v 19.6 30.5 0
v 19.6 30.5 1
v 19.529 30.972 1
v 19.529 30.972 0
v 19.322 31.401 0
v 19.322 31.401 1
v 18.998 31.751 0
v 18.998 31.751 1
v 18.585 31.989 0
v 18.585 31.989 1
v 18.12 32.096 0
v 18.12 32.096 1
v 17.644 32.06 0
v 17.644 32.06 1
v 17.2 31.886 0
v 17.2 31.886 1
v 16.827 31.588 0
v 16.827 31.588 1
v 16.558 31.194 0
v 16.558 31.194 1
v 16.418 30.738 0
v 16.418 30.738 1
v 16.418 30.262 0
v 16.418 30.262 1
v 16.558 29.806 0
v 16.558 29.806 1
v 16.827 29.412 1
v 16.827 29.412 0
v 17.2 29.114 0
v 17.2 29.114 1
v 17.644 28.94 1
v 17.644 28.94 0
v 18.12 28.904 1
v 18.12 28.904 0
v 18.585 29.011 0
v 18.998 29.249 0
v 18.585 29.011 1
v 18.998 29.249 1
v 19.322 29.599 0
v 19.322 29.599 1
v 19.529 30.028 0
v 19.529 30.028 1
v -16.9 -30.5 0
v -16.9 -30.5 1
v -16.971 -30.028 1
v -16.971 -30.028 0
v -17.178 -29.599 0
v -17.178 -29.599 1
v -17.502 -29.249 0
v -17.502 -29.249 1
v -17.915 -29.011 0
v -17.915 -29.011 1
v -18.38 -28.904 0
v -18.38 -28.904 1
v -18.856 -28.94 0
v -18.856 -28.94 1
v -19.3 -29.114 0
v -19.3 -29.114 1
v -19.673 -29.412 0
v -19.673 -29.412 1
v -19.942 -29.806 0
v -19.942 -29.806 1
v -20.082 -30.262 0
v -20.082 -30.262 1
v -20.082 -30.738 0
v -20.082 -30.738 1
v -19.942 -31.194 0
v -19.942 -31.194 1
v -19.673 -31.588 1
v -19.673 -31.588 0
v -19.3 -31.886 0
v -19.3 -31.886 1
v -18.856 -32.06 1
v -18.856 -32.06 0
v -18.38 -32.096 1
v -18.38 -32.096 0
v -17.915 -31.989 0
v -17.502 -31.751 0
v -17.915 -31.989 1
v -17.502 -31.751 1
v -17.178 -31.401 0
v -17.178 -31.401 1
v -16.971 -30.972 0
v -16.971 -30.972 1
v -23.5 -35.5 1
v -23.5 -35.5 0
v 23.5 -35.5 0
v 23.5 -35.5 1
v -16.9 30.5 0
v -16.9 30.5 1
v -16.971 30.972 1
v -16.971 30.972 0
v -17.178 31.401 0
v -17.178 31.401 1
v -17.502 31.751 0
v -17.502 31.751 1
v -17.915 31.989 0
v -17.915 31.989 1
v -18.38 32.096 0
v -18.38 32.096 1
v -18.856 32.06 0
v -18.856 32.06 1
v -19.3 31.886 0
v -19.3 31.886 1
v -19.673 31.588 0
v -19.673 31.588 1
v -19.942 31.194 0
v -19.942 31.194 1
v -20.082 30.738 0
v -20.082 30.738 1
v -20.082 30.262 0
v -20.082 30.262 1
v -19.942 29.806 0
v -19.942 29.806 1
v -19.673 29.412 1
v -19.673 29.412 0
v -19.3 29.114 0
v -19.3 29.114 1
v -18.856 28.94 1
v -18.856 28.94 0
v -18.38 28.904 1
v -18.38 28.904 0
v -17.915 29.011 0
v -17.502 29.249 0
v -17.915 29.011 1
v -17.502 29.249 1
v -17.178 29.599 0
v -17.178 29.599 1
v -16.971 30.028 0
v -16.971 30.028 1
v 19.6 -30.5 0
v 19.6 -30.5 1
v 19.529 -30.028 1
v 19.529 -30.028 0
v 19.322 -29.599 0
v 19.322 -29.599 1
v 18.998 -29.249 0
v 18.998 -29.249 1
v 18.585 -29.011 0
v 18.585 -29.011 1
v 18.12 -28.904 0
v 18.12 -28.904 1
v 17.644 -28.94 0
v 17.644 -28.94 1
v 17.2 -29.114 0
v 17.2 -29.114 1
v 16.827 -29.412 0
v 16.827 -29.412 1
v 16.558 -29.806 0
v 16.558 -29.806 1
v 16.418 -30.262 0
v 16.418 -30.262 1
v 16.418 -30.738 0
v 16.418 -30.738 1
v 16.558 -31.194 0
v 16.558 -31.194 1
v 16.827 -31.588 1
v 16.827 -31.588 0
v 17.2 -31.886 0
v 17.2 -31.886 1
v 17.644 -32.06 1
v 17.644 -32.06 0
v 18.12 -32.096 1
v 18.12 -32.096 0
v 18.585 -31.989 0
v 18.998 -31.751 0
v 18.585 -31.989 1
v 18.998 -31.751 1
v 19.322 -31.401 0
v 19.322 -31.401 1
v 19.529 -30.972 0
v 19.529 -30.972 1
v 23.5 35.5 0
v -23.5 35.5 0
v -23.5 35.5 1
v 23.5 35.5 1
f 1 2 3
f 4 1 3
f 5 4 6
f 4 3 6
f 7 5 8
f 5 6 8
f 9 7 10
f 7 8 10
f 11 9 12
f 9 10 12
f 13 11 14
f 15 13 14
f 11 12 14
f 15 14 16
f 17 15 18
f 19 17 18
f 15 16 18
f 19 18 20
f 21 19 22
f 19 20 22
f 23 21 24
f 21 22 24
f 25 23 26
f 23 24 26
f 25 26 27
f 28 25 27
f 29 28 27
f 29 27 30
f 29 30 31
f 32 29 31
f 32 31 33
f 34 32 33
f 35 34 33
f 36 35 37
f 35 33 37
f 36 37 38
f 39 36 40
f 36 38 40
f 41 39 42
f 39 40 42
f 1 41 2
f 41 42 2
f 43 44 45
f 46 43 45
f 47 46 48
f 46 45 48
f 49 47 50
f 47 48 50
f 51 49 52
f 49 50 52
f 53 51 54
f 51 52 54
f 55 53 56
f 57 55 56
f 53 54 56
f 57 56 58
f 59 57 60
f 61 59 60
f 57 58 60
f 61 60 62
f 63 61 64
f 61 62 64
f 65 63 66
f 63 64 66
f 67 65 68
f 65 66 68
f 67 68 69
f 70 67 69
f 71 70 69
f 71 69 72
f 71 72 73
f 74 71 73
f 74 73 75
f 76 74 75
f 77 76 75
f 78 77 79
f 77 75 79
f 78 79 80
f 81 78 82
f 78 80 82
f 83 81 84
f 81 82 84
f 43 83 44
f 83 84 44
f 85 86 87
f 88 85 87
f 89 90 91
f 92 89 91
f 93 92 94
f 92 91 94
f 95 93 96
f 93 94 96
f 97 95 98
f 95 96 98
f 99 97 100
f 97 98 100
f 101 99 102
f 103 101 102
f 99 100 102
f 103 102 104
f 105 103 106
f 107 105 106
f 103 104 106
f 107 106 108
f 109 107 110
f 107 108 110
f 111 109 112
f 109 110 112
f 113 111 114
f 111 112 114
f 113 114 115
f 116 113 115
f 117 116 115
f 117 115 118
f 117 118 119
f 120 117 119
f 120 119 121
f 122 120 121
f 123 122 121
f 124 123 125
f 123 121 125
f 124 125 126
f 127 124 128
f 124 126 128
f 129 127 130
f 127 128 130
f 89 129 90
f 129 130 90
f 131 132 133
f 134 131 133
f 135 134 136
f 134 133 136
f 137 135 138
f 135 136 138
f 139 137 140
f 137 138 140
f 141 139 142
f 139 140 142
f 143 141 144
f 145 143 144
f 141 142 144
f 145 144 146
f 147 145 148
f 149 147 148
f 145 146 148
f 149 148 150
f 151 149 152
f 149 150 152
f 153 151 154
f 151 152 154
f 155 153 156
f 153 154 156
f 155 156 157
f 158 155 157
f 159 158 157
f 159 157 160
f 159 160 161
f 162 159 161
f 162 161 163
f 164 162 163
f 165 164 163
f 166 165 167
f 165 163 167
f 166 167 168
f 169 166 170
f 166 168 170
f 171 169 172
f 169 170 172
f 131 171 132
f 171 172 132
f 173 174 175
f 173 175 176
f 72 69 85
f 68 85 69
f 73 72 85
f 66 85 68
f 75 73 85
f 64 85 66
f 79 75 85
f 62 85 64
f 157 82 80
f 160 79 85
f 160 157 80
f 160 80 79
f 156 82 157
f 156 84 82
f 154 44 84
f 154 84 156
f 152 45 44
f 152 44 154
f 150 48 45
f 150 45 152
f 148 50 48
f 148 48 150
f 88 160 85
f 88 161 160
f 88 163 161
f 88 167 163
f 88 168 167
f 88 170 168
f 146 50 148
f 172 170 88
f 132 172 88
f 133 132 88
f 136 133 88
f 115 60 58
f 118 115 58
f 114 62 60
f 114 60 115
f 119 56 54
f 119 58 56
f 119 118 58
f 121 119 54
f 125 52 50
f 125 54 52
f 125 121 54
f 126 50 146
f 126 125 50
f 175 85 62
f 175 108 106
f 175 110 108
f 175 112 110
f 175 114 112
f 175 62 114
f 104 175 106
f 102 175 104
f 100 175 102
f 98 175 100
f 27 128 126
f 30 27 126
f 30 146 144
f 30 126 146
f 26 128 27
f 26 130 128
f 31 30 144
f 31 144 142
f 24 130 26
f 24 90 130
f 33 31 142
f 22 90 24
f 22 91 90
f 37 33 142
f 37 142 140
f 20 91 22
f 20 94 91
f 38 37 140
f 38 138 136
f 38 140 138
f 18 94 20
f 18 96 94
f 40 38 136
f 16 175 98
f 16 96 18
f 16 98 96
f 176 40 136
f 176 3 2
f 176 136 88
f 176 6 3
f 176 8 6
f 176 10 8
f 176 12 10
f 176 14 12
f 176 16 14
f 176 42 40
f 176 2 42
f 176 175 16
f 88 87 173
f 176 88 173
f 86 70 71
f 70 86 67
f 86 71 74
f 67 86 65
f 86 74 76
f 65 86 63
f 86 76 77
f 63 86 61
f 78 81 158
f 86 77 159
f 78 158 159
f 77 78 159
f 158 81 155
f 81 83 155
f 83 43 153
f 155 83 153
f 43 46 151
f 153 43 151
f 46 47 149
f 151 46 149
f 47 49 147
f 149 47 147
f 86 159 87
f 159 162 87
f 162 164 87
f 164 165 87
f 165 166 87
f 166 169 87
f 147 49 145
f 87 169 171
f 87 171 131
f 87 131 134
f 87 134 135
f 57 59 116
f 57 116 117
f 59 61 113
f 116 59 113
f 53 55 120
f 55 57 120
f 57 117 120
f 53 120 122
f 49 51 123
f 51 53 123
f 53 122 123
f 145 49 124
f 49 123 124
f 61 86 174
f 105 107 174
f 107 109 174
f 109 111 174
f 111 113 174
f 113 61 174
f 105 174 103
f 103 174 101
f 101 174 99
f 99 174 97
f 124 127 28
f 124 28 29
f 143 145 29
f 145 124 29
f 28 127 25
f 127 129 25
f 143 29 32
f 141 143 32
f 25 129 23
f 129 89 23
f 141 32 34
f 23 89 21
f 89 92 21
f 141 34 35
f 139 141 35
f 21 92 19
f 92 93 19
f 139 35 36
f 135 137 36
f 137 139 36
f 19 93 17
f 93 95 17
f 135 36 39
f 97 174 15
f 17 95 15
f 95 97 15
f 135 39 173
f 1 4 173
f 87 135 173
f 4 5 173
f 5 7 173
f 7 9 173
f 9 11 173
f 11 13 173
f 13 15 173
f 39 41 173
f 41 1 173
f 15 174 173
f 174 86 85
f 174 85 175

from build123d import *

# Parameters (mm, degrees)
SKETCH_1_W                  = 47
SKETCH_1_H                  = 71
EXTRUDE_1_DEPTH             = 1
SKETCH_2_R                  = 1.6
CUT_EXTRUDE_1_DEPTH         = 1
PATTERN_LINEAR_1_COUNT      = 2
PATTERN_LINEAR_1_PITCH      = 36.5
PATTERN_LINEAR_1_COUNT_DIR2 = 2
PATTERN_LINEAR_1_PITCH_DIR2 = 61


with BuildPart() as part:
    # ｽｹｯﾁ1 → ﾎﾞｽ - 押し出し1 (new body)
    with BuildSketch(Plane.XY):
        Rectangle(SKETCH_1_W, SKETCH_1_H)
    extrude(amount=EXTRUDE_1_DEPTH)

    # ｽｹｯﾁ2 → ｶｯﾄ - 押し出し1 (cut)
    with BuildSketch(Plane.XY.offset(1)):
        with Locations((-18.5, -30.5)):
            Circle(SKETCH_2_R)
    cut_extrude_1 = extrude(amount=-CUT_EXTRUDE_1_DEPTH, mode=Mode.SUBTRACT)

    # 直線ﾊﾟﾀｰﾝ1: Cut-Extrude 1 2 × 2
    with Locations(*[(i * PATTERN_LINEAR_1_PITCH, j * PATTERN_LINEAR_1_PITCH_DIR2, 0) for i in range(PATTERN_LINEAR_1_COUNT) for j in range(PATTERN_LINEAR_1_COUNT_DIR2) if (i, j) != (0, 0)]):
        add(cut_extrude_1, mode=Mode.SUBTRACT)


solid = part.part
